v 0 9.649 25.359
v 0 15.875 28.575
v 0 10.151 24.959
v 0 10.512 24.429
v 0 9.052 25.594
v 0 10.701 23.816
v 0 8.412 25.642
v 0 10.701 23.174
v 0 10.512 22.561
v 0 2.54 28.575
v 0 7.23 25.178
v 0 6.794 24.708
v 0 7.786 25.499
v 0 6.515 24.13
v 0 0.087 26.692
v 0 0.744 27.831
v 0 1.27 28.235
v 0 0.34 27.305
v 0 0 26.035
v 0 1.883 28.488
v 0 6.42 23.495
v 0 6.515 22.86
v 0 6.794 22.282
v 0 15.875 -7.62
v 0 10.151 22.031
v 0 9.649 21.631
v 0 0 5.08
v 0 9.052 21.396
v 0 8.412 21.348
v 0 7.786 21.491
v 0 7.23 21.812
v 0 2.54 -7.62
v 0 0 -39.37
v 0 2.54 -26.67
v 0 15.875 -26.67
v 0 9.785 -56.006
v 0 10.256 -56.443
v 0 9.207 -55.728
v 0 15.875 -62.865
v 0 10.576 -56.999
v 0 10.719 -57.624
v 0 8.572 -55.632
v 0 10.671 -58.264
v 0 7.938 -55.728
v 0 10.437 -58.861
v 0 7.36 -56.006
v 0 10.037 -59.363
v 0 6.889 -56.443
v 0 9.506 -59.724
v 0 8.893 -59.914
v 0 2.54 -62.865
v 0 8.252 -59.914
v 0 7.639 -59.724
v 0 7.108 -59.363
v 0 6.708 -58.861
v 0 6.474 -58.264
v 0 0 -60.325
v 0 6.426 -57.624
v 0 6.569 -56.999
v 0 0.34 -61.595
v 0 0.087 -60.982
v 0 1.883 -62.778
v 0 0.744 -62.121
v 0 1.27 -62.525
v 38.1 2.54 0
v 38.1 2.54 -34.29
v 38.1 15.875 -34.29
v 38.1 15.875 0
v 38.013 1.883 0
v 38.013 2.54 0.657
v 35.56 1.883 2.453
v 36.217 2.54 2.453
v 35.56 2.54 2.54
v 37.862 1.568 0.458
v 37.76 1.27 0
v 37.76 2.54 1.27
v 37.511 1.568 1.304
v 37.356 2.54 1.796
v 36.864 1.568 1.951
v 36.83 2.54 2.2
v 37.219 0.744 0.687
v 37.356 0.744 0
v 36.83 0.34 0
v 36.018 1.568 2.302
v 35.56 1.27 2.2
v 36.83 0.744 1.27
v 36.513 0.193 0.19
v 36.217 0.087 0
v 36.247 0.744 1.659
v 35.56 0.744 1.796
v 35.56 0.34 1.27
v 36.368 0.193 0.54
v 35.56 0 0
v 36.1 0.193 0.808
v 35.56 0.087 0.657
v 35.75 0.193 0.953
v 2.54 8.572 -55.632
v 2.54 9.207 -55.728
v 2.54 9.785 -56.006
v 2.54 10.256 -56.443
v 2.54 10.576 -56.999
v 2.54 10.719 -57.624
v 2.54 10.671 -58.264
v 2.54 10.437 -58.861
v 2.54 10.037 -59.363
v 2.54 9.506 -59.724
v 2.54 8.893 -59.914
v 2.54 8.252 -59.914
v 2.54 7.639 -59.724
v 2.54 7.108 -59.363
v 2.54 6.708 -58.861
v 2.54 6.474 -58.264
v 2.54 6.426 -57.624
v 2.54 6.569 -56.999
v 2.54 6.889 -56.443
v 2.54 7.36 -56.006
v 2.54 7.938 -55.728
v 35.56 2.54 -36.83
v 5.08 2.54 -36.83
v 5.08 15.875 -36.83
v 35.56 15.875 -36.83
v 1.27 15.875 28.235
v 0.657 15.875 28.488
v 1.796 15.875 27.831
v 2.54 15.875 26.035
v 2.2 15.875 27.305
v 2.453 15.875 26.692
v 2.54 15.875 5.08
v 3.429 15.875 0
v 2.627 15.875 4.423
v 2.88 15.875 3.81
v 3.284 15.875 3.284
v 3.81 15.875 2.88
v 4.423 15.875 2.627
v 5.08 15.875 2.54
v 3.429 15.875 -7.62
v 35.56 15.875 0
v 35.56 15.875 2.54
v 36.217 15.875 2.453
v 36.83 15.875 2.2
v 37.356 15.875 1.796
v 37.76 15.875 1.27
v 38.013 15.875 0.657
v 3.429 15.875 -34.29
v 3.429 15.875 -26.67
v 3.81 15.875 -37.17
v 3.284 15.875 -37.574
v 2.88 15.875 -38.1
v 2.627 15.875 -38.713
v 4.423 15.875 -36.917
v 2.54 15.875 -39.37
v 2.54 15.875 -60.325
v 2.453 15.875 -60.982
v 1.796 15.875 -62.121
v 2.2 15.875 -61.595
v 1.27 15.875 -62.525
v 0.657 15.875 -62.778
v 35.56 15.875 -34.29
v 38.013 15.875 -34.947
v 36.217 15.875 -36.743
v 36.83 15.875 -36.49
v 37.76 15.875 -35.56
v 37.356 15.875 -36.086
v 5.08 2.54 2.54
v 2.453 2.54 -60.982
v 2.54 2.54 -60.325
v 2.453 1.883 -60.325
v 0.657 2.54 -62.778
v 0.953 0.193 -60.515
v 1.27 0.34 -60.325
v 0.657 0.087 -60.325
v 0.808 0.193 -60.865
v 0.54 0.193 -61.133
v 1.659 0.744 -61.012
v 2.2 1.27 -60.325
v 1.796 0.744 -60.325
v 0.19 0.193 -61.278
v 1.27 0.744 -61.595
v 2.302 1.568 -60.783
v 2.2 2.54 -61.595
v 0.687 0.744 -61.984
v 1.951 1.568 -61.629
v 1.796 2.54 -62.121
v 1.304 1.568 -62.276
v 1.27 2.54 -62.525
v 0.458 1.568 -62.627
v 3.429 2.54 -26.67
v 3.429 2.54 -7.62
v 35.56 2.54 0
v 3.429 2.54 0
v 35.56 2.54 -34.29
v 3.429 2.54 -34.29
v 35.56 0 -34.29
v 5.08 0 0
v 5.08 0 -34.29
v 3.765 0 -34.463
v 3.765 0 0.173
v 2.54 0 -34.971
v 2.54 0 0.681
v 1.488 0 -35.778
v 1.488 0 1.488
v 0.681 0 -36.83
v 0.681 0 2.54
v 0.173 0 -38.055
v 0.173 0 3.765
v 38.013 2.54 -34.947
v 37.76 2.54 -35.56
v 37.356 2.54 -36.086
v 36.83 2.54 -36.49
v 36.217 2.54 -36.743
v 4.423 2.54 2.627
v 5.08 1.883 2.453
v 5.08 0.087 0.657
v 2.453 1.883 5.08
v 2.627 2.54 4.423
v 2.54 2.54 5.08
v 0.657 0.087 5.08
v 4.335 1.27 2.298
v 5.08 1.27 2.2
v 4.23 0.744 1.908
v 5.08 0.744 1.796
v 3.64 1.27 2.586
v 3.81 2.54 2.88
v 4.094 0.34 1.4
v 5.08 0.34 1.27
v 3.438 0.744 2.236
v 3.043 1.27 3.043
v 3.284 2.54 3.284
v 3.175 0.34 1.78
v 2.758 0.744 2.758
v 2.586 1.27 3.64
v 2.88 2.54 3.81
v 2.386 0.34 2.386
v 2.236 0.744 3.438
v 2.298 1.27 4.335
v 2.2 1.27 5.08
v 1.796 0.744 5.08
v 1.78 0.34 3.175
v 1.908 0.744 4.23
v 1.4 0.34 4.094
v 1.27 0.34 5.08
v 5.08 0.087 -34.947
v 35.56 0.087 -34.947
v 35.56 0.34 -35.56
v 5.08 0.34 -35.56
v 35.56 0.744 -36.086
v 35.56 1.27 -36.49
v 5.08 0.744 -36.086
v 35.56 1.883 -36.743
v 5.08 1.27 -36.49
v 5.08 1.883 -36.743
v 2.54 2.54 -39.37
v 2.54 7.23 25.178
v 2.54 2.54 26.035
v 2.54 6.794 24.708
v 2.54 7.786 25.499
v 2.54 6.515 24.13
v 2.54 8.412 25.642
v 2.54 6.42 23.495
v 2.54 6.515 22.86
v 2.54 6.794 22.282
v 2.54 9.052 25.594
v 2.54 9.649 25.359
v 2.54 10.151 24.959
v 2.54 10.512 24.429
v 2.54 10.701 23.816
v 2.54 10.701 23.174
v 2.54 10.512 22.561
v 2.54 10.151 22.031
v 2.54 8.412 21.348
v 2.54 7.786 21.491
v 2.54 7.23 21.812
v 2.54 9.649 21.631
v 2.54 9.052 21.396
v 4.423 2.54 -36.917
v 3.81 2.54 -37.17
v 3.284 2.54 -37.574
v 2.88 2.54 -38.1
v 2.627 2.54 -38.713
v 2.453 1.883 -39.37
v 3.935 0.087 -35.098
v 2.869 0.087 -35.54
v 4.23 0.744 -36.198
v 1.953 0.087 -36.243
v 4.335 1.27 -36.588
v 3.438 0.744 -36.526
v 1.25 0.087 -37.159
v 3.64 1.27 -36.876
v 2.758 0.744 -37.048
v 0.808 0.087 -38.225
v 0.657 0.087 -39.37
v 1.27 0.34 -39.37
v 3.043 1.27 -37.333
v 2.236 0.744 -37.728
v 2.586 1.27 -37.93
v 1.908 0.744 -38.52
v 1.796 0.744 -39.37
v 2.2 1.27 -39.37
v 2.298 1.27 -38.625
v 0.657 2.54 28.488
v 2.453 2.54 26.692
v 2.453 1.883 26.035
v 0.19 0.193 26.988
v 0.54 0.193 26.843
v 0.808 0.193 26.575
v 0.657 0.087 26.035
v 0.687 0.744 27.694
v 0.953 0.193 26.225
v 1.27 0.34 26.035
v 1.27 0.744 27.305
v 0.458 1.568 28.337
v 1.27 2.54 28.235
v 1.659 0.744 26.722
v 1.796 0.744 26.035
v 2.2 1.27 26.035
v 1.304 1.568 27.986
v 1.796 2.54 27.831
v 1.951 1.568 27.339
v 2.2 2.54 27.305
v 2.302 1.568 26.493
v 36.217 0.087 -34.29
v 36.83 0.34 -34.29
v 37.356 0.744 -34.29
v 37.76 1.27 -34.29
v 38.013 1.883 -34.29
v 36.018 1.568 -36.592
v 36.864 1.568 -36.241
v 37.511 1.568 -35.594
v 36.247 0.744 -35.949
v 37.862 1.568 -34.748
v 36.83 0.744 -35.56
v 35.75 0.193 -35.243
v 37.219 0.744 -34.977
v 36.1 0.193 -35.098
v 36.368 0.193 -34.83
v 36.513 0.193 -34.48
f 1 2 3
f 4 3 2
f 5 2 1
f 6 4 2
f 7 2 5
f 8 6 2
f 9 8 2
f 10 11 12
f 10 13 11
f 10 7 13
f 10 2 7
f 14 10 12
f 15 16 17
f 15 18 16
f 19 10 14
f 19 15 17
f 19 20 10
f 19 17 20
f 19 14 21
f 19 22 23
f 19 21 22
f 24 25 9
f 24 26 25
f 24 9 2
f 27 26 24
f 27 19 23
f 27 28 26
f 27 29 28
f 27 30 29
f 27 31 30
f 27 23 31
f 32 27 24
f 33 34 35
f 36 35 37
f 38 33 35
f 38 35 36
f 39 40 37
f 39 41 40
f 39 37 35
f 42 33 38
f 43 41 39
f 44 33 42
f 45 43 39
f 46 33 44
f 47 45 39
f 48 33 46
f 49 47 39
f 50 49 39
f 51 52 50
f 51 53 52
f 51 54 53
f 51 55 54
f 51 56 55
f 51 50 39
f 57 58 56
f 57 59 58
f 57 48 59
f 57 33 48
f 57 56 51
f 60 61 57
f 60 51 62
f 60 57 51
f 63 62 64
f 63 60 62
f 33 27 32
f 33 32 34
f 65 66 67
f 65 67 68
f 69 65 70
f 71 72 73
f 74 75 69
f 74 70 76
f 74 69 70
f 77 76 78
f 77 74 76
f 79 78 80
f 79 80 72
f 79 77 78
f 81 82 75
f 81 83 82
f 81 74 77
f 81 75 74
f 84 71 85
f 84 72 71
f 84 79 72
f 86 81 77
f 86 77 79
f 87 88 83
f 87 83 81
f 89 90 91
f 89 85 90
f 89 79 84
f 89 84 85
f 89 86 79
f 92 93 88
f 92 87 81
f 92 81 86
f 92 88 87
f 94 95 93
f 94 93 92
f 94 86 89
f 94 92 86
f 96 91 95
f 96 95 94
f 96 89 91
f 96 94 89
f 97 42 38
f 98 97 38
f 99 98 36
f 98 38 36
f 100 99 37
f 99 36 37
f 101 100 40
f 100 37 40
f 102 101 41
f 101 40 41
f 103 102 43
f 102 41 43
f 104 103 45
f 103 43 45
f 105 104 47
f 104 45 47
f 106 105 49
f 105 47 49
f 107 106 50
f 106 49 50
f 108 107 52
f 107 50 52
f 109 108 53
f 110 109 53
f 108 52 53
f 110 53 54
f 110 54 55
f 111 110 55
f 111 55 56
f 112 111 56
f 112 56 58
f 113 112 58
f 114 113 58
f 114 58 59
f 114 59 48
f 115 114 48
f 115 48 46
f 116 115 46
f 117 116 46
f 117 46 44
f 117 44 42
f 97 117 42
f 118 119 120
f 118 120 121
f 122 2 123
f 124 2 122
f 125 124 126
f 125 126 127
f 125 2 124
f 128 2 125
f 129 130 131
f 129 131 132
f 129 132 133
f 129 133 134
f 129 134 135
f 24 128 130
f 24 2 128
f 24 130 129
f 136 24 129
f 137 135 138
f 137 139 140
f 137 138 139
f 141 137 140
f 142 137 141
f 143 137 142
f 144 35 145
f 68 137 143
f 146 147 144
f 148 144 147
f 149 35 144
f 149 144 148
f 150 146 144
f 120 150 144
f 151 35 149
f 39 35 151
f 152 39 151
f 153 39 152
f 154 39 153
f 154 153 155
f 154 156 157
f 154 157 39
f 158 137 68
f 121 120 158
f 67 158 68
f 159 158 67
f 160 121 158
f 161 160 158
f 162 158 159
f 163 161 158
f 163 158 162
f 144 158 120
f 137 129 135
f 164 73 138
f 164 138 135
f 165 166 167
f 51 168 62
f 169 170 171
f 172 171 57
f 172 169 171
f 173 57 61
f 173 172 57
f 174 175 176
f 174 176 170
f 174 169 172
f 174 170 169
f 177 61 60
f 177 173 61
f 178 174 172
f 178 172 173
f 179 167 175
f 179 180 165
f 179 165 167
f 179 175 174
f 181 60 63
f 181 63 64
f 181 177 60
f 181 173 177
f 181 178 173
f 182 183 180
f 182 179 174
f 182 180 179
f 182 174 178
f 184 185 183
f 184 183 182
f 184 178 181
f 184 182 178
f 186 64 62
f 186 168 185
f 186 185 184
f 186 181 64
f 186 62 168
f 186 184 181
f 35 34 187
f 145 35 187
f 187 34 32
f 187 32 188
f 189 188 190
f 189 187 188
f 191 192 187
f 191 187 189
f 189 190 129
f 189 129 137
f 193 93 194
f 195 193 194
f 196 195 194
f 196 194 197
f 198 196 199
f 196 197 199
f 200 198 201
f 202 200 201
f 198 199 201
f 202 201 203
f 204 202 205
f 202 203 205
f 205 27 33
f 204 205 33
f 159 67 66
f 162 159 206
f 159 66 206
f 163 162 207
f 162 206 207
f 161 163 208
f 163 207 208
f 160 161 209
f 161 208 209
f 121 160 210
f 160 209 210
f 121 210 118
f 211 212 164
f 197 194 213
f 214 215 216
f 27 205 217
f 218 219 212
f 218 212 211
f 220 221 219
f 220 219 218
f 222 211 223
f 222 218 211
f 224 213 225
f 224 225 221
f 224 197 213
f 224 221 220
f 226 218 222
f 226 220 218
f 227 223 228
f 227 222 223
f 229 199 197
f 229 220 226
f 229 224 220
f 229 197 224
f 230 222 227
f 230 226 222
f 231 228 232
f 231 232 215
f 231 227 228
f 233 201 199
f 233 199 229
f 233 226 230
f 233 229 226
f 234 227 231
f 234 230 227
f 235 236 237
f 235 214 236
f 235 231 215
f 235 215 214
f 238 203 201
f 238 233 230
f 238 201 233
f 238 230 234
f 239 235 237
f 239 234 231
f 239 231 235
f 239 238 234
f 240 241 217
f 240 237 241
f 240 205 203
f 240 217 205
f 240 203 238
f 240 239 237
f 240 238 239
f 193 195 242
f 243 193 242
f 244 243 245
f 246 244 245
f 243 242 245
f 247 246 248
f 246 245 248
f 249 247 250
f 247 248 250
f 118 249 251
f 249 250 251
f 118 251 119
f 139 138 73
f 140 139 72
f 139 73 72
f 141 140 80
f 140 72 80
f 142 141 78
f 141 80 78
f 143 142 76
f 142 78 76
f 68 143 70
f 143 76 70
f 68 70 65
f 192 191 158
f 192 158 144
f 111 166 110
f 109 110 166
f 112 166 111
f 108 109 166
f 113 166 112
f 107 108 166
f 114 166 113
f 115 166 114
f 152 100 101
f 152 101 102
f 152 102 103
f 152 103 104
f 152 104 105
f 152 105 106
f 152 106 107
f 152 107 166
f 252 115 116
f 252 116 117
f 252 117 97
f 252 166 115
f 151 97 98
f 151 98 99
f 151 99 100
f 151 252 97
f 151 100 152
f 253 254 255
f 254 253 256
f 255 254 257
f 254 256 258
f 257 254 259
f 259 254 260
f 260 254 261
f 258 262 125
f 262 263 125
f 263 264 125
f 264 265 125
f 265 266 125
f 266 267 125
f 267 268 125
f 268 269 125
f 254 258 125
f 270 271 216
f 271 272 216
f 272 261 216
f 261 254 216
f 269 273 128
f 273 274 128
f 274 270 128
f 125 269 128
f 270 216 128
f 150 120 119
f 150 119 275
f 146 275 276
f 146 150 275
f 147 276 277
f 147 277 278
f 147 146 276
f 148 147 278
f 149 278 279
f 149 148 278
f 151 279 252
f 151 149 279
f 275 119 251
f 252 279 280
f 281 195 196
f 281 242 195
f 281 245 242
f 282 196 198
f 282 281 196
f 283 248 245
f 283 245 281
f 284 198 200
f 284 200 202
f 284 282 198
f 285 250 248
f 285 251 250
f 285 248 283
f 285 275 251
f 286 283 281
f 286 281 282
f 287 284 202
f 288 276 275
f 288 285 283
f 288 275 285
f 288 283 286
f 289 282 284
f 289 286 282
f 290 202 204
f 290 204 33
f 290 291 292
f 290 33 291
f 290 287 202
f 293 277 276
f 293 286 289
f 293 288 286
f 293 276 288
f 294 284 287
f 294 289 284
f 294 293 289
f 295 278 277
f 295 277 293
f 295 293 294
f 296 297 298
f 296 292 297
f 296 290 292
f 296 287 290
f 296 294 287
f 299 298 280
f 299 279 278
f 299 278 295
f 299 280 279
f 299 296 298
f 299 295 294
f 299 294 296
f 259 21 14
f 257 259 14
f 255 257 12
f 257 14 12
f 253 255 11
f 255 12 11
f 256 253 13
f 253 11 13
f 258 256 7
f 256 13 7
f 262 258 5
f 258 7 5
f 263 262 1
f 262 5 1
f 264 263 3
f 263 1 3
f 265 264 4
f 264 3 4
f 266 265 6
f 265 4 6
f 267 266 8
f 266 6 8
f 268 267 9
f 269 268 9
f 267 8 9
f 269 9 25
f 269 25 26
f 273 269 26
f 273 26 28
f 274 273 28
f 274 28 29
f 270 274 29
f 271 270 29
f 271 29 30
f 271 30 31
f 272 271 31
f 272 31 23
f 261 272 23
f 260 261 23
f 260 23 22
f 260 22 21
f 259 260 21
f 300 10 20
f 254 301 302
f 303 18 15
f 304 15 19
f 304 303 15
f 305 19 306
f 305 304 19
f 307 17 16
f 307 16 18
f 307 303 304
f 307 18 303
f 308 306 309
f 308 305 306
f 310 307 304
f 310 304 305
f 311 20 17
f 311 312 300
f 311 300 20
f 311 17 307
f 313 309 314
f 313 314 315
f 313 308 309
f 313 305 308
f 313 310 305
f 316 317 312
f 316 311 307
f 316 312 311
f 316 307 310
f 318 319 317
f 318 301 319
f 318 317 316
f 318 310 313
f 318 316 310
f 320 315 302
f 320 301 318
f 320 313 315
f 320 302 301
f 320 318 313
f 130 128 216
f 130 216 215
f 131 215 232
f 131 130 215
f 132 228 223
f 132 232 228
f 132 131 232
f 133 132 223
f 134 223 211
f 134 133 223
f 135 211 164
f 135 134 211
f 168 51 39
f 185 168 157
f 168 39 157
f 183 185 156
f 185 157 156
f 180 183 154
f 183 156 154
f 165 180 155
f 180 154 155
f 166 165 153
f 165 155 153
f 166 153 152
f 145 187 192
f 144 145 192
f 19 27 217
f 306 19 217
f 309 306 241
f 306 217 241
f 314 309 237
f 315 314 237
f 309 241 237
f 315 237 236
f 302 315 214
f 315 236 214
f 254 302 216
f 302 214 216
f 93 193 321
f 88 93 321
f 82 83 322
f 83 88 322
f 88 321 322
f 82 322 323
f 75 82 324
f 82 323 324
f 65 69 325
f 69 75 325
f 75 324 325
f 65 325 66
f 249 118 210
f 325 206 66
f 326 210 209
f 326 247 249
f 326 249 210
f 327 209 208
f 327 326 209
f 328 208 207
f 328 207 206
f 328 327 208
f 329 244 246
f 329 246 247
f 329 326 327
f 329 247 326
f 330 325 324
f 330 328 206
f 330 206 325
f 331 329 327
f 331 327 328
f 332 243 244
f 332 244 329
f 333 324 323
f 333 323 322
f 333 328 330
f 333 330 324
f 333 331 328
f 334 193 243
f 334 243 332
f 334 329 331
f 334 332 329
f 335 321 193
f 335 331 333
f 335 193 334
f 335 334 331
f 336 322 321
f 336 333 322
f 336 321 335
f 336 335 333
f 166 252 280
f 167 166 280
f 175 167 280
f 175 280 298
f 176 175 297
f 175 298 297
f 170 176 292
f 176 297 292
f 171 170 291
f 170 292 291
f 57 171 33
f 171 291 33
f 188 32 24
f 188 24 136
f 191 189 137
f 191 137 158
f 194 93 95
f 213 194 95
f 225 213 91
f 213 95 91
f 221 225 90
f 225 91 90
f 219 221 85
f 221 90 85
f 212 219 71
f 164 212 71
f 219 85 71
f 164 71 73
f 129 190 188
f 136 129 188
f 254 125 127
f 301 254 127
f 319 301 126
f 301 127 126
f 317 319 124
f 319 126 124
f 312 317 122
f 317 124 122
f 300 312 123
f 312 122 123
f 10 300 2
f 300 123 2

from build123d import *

# Parameters (mm, degrees)
SKETCH1_W           = 35.56
SKETCH1_H           = 34.29
BOSS_EXTRUDE1_DEPTH = 2.54
BOSS_EXTRUDE4_DEPTH = 15.875
SKETCH6_W           = 2.54
SKETCH6_H           = 15.875
BOSS_EXTRUDE5_DEPTH = 26.035
SKETCH7_W           = 2.54
SKETCH7_H           = 15.875
BOSS_EXTRUDE6_DEPTH = 26.035
CUT_EXTRUDE1_REACH  = 77.204
SKETCH8_R           = 2.15265
FILLET1_R           = 2.54
SKETCH10_W          = 3.429
SKETCH10_H          = 7.62
BOSS_EXTRUDE7_DEPTH = 13.335


with BuildPart() as part:
    # Sketch1 → Boss-Extrude1 (new body)
    with BuildSketch(Plane(origin=(0, 0, 0), x_dir=(1, 0, 0), z_dir=(0, 1, 0))):
        with Locations((17.78, 17.145)):
            Rectangle(SKETCH1_W, SKETCH1_H)
    extrude(amount=BOSS_EXTRUDE1_DEPTH)

    # Sketch2 → Boss-Extrude4 (add)
    with BuildSketch(Plane(origin=(0, 0, 0), x_dir=(1, 0, 0), z_dir=(0, 1, 0))):
        Polygon((0, 34.29), (0, 36.83), (38.1, 36.83), (38.1, -2.54), (0, -2.54), (0, 0), (35.56, 0), (35.56, 34.29), align=None)
    extrude(amount=BOSS_EXTRUDE4_DEPTH)

    # Sketch6 → Boss-Extrude5 (add)
    with BuildSketch(Plane.XY.offset(2.54)):
        with Locations((1.27, 7.9375)):
            Rectangle(SKETCH6_W, SKETCH6_H)
    extrude(amount=BOSS_EXTRUDE5_DEPTH)

    # Sketch7 → Boss-Extrude6 (add)
    with BuildSketch(Plane(origin=(0, 0, -36.83), x_dir=(-1, 0, 0), z_dir=(0, 0, -1))):
        with Locations((-1.27, 7.9375)):
            Rectangle(SKETCH7_W, SKETCH7_H)
    extrude(amount=BOSS_EXTRUDE6_DEPTH)

    # Sketch8 → Cut-Extrude1 (cut, up to next)
    with BuildSketch(Plane.ZY, mode=Mode.PRIVATE) as cut_extrude1_sk1:
        with Locations((-57.785, 8.5725)):
            Circle(SKETCH8_R)
    cut_extrude1_tool1 = extrude(cut_extrude1_sk1.sketch, amount=-CUT_EXTRUDE1_REACH, mode=Mode.PRIVATE) & part.part
    # Sketch8 → Cut-Extrude1 (cut, up to next)
    with BuildSketch(Plane.ZY, mode=Mode.PRIVATE) as cut_extrude1_sk2:
        with Locations(Location((23.495, 8.5725, 0), (0, 0, 270))):
            Circle(SKETCH8_R)
    cut_extrude1_tool2 = extrude(cut_extrude1_sk2.sketch, amount=-CUT_EXTRUDE1_REACH, mode=Mode.PRIVATE) & part.part
    add(cut_extrude1_tool1.solids().sort_by_distance((0, 8.5725, -57.785))[0], mode=Mode.SUBTRACT)
    add(cut_extrude1_tool2.solids().sort_by_distance((0, 8.5725, 23.495))[0], mode=Mode.SUBTRACT)

    # Fillet1
    # the kernel refuses this fillet: 2.54 mm, written as the material it adds along each edge
    with BuildSketch(Plane(origin=(2.54, 15.875, -36.83), x_dir=(1, 0, 0), z_dir=(0, -1, 0))) as fillet1_piece_1:
        with BuildLine():
            CenterArc((FILLET1_R, -FILLET1_R), FILLET1_R, 90, 90)
            Line((0, -FILLET1_R), (0, 0))
            Line((0, 0), (FILLET1_R, 0))
        make_face()
    extrude(amount=15.875)
    with BuildSketch(Plane(origin=(2.54, 15.875, 2.54), x_dir=(1, 0, 0), z_dir=(0, -1, 0))) as fillet1_piece_2:
        with BuildLine():
            CenterArc((FILLET1_R, FILLET1_R), FILLET1_R, 180, 90)
            Line((0, FILLET1_R), (0, 0))
            Line((0, 0), (FILLET1_R, 0))
        make_face()
    extrude(amount=15.875)
    # the kernel refuses this fillet: 2.54 mm, written as the material it takes off along each edge
    with BuildSketch(Plane(origin=(38.1, -6.35, -36.83), x_dir=(0, 0, 1), z_dir=(0, 1, 0)), Plane(origin=(38.1, -6.35, 2.54), x_dir=(-1, 0, 0), z_dir=(0, 1, 0)), Plane(origin=(2.54, 22.225, -62.865), x_dir=(-1, 0, 0), z_dir=(0, -1, 0))) as fillet1_2_piece_1:
        with BuildLine():
            CenterArc((FILLET1_R, -FILLET1_R), FILLET1_R, 90, 90)
            Line((0, -FILLET1_R), (0, 0))
            Line((0, 0), (FILLET1_R, 0))
        make_face()
    extrude(amount=28.575, mode=Mode.SUBTRACT)
    with BuildSketch(Plane(origin=(2.54, 22.225, 28.575), x_dir=(-1, 0, 0), z_dir=(0, -1, 0))) as fillet1_2_piece_2:
        with BuildLine():
            CenterArc((FILLET1_R, FILLET1_R), FILLET1_R, 180, 90)
            Line((0, FILLET1_R), (0, 0))
            Line((0, 0), (FILLET1_R, 0))
        make_face()
    extrude(amount=28.575, mode=Mode.SUBTRACT)
    with BuildSketch(Plane(origin=(38.1, 0, -43.18), x_dir=(-1, 0, 0), z_dir=(0, 0, 1))) as fillet1_2_piece_3:
        with BuildLine():
            CenterArc((FILLET1_R, -FILLET1_R), FILLET1_R, 90, 90)
            Line((0, -FILLET1_R), (0, 0))
            Line((0, 0), (FILLET1_R, 0))
        make_face()
    extrude(amount=52.07, mode=Mode.SUBTRACT)
    # the kernel refuses this fillet: 2.54 mm, written as the material it takes off along each edge
    with BuildSketch(Plane(origin=(35.56, 2.54, 0), x_dir=(0, 0, 1), z_dir=(0, -1, 0))) as fillet1_3_piece_1_section:
        Polygon((0, 0), (FILLET1_R, 0), (FILLET1_R, -FILLET1_R), (0, -FILLET1_R), align=None)
    fillet1_3_piece_1 = extrude(amount=FILLET1_R, mode=Mode.PRIVATE)
    fillet1_3_piece_1 = fillet1_3_piece_1 - Plane(origin=(35.56, 2.54, 0), x_dir=(-0.7071067811865475, 0, -0.7071067811865475), z_dir=(0, -1, 0)) * Sphere(FILLET1_R, mode=Mode.PRIVATE)
    add(fillet1_3_piece_1, mode=Mode.SUBTRACT)
    with BuildSketch(Plane(origin=(35.56, 2.54, -34.29), x_dir=(0, 0, -1), z_dir=(0, -1, 0))) as fillet1_3_piece_2_section:
        Polygon((0, 0), (FILLET1_R, 0), (FILLET1_R, FILLET1_R), (0, FILLET1_R), align=None)
    fillet1_3_piece_2 = extrude(amount=FILLET1_R, mode=Mode.PRIVATE)
    fillet1_3_piece_2 = fillet1_3_piece_2 - Plane(origin=(35.56, 2.54, -34.29), x_dir=(-0.7071067811865475, 0, 0.7071067811865475), z_dir=(0, -1, 0)) * Sphere(FILLET1_R, mode=Mode.PRIVATE)
    add(fillet1_3_piece_2, mode=Mode.SUBTRACT)
    with BuildSketch(Plane(origin=(2.54, 0, -39.37), x_dir=(-1, 0, 0), z_dir=(0, 0, -1))) as fillet1_3_piece_3:
        with BuildLine():
            CenterArc((FILLET1_R, FILLET1_R), FILLET1_R, 180, 90)
            Line((0, FILLET1_R), (0, 0))
            Line((0, 0), (FILLET1_R, 0))
        make_face()
    extrude(amount=20.955, mode=Mode.SUBTRACT)
    with BuildSketch(Plane(origin=(5.08, 0, -36.83), x_dir=(0, 0, 1), z_dir=(1, 0, 0)), Plane(origin=(35.56, 0, 2.54), x_dir=(0, 0, -1), z_dir=(-1, 0, 0))) as fillet1_3_piece_4:
        with BuildLine():
            CenterArc((FILLET1_R, -FILLET1_R), FILLET1_R, 90, 90)
            Line((0, -FILLET1_R), (0, 0))
            Line((0, 0), (FILLET1_R, 0))
        make_face()
    extrude(amount=30.48, mode=Mode.SUBTRACT)
    with BuildSketch(Plane(origin=(2.54, 0, 5.08), x_dir=(-1, 0, 0), z_dir=(0, 0, 1))) as fillet1_3_piece_5:
        with BuildLine():
            CenterArc((FILLET1_R, -FILLET1_R), FILLET1_R, 90, 90)
            Line((0, -FILLET1_R), (0, 0))
            Line((0, 0), (FILLET1_R, 0))
        make_face()
    extrude(amount=20.955, mode=Mode.SUBTRACT)
    with BuildSketch(Plane(origin=(5.08, 0, 5.08), x_dir=(0, 0, -1), z_dir=(1, 0, 0))) as fillet1_3_piece_6:
        with BuildLine():
            CenterArc((2.54 + FILLET1_R, FILLET1_R), FILLET1_R, 180, 90)
            Line((2.54, FILLET1_R), (2.54, 0))
            Line((2.54, 0), (2.54 + FILLET1_R, 0))
        make_face()
    revolve(axis=Axis((5.08, 0, 5.08), (0, 1, 0)), revolution_arc=90, mode=Mode.SUBTRACT)
    with BuildSketch(Plane(origin=(0, 0, 26.035), x_dir=(-0.5976672776328251, 0, -0.8017442392976499), z_dir=(0.8017442392976499, 0, -0.5976672776328251))) as fillet1_3_piece_7:
        with BuildLine():
            CenterArc((2.54 - FILLET1_R, FILLET1_R), FILLET1_R, 270, 90)
            Line((2.54, FILLET1_R), (2.54, 0))
            Line((2.54, 0), (2.54 - FILLET1_R, 0))
        make_face()
    revolve(axis=Axis((0, 0, 26.035), (0, 1, 0)), revolution_arc=233.296989237, mode=Mode.SUBTRACT)
    with BuildSketch(Plane(origin=(5.08, 0, -39.37), x_dir=(0, 0, 1), z_dir=(1, 0, 0))) as fillet1_3_piece_8:
        with BuildLine():
            CenterArc((2.54 + FILLET1_R, -FILLET1_R), FILLET1_R, 90, 90)
            Line((2.54, -FILLET1_R), (2.54, 0))
            Line((2.54, 0), (2.54 + FILLET1_R, 0))
        make_face()
    revolve(axis=Axis((5.08, 0, -39.37), (0, -1, 0)), revolution_arc=90, mode=Mode.SUBTRACT)
    with BuildSketch(Plane(origin=(0, 0, -60.325), x_dir=(1, 0, 0), z_dir=(0, 0, 1))) as fillet1_3_piece_9:
        with BuildLine():
            CenterArc((2.54 - FILLET1_R, FILLET1_R), FILLET1_R, 270, 90)
            Line((2.54, FILLET1_R), (2.54, 0))
            Line((2.54, 0), (2.54 - FILLET1_R, 0))
        make_face()
    revolve(axis=Axis((0, 0, -60.325), (0, 1, 0)), revolution_arc=233.296989237, mode=Mode.SUBTRACT)

    # Sketch10 → Boss-Extrude7 (add)
    with BuildSketch(Plane(origin=(0, 2.54, 0), x_dir=(1, 0, 0), z_dir=(0, 1, 0))):
        with Locations((1.7145, 30.48)):
            Rectangle(SKETCH10_W, SKETCH10_H)
        with Locations((1.7145, 3.81)):
            Rectangle(SKETCH10_W, SKETCH10_H)
    extrude(amount=BOSS_EXTRUDE7_DEPTH)


solid = part.part
